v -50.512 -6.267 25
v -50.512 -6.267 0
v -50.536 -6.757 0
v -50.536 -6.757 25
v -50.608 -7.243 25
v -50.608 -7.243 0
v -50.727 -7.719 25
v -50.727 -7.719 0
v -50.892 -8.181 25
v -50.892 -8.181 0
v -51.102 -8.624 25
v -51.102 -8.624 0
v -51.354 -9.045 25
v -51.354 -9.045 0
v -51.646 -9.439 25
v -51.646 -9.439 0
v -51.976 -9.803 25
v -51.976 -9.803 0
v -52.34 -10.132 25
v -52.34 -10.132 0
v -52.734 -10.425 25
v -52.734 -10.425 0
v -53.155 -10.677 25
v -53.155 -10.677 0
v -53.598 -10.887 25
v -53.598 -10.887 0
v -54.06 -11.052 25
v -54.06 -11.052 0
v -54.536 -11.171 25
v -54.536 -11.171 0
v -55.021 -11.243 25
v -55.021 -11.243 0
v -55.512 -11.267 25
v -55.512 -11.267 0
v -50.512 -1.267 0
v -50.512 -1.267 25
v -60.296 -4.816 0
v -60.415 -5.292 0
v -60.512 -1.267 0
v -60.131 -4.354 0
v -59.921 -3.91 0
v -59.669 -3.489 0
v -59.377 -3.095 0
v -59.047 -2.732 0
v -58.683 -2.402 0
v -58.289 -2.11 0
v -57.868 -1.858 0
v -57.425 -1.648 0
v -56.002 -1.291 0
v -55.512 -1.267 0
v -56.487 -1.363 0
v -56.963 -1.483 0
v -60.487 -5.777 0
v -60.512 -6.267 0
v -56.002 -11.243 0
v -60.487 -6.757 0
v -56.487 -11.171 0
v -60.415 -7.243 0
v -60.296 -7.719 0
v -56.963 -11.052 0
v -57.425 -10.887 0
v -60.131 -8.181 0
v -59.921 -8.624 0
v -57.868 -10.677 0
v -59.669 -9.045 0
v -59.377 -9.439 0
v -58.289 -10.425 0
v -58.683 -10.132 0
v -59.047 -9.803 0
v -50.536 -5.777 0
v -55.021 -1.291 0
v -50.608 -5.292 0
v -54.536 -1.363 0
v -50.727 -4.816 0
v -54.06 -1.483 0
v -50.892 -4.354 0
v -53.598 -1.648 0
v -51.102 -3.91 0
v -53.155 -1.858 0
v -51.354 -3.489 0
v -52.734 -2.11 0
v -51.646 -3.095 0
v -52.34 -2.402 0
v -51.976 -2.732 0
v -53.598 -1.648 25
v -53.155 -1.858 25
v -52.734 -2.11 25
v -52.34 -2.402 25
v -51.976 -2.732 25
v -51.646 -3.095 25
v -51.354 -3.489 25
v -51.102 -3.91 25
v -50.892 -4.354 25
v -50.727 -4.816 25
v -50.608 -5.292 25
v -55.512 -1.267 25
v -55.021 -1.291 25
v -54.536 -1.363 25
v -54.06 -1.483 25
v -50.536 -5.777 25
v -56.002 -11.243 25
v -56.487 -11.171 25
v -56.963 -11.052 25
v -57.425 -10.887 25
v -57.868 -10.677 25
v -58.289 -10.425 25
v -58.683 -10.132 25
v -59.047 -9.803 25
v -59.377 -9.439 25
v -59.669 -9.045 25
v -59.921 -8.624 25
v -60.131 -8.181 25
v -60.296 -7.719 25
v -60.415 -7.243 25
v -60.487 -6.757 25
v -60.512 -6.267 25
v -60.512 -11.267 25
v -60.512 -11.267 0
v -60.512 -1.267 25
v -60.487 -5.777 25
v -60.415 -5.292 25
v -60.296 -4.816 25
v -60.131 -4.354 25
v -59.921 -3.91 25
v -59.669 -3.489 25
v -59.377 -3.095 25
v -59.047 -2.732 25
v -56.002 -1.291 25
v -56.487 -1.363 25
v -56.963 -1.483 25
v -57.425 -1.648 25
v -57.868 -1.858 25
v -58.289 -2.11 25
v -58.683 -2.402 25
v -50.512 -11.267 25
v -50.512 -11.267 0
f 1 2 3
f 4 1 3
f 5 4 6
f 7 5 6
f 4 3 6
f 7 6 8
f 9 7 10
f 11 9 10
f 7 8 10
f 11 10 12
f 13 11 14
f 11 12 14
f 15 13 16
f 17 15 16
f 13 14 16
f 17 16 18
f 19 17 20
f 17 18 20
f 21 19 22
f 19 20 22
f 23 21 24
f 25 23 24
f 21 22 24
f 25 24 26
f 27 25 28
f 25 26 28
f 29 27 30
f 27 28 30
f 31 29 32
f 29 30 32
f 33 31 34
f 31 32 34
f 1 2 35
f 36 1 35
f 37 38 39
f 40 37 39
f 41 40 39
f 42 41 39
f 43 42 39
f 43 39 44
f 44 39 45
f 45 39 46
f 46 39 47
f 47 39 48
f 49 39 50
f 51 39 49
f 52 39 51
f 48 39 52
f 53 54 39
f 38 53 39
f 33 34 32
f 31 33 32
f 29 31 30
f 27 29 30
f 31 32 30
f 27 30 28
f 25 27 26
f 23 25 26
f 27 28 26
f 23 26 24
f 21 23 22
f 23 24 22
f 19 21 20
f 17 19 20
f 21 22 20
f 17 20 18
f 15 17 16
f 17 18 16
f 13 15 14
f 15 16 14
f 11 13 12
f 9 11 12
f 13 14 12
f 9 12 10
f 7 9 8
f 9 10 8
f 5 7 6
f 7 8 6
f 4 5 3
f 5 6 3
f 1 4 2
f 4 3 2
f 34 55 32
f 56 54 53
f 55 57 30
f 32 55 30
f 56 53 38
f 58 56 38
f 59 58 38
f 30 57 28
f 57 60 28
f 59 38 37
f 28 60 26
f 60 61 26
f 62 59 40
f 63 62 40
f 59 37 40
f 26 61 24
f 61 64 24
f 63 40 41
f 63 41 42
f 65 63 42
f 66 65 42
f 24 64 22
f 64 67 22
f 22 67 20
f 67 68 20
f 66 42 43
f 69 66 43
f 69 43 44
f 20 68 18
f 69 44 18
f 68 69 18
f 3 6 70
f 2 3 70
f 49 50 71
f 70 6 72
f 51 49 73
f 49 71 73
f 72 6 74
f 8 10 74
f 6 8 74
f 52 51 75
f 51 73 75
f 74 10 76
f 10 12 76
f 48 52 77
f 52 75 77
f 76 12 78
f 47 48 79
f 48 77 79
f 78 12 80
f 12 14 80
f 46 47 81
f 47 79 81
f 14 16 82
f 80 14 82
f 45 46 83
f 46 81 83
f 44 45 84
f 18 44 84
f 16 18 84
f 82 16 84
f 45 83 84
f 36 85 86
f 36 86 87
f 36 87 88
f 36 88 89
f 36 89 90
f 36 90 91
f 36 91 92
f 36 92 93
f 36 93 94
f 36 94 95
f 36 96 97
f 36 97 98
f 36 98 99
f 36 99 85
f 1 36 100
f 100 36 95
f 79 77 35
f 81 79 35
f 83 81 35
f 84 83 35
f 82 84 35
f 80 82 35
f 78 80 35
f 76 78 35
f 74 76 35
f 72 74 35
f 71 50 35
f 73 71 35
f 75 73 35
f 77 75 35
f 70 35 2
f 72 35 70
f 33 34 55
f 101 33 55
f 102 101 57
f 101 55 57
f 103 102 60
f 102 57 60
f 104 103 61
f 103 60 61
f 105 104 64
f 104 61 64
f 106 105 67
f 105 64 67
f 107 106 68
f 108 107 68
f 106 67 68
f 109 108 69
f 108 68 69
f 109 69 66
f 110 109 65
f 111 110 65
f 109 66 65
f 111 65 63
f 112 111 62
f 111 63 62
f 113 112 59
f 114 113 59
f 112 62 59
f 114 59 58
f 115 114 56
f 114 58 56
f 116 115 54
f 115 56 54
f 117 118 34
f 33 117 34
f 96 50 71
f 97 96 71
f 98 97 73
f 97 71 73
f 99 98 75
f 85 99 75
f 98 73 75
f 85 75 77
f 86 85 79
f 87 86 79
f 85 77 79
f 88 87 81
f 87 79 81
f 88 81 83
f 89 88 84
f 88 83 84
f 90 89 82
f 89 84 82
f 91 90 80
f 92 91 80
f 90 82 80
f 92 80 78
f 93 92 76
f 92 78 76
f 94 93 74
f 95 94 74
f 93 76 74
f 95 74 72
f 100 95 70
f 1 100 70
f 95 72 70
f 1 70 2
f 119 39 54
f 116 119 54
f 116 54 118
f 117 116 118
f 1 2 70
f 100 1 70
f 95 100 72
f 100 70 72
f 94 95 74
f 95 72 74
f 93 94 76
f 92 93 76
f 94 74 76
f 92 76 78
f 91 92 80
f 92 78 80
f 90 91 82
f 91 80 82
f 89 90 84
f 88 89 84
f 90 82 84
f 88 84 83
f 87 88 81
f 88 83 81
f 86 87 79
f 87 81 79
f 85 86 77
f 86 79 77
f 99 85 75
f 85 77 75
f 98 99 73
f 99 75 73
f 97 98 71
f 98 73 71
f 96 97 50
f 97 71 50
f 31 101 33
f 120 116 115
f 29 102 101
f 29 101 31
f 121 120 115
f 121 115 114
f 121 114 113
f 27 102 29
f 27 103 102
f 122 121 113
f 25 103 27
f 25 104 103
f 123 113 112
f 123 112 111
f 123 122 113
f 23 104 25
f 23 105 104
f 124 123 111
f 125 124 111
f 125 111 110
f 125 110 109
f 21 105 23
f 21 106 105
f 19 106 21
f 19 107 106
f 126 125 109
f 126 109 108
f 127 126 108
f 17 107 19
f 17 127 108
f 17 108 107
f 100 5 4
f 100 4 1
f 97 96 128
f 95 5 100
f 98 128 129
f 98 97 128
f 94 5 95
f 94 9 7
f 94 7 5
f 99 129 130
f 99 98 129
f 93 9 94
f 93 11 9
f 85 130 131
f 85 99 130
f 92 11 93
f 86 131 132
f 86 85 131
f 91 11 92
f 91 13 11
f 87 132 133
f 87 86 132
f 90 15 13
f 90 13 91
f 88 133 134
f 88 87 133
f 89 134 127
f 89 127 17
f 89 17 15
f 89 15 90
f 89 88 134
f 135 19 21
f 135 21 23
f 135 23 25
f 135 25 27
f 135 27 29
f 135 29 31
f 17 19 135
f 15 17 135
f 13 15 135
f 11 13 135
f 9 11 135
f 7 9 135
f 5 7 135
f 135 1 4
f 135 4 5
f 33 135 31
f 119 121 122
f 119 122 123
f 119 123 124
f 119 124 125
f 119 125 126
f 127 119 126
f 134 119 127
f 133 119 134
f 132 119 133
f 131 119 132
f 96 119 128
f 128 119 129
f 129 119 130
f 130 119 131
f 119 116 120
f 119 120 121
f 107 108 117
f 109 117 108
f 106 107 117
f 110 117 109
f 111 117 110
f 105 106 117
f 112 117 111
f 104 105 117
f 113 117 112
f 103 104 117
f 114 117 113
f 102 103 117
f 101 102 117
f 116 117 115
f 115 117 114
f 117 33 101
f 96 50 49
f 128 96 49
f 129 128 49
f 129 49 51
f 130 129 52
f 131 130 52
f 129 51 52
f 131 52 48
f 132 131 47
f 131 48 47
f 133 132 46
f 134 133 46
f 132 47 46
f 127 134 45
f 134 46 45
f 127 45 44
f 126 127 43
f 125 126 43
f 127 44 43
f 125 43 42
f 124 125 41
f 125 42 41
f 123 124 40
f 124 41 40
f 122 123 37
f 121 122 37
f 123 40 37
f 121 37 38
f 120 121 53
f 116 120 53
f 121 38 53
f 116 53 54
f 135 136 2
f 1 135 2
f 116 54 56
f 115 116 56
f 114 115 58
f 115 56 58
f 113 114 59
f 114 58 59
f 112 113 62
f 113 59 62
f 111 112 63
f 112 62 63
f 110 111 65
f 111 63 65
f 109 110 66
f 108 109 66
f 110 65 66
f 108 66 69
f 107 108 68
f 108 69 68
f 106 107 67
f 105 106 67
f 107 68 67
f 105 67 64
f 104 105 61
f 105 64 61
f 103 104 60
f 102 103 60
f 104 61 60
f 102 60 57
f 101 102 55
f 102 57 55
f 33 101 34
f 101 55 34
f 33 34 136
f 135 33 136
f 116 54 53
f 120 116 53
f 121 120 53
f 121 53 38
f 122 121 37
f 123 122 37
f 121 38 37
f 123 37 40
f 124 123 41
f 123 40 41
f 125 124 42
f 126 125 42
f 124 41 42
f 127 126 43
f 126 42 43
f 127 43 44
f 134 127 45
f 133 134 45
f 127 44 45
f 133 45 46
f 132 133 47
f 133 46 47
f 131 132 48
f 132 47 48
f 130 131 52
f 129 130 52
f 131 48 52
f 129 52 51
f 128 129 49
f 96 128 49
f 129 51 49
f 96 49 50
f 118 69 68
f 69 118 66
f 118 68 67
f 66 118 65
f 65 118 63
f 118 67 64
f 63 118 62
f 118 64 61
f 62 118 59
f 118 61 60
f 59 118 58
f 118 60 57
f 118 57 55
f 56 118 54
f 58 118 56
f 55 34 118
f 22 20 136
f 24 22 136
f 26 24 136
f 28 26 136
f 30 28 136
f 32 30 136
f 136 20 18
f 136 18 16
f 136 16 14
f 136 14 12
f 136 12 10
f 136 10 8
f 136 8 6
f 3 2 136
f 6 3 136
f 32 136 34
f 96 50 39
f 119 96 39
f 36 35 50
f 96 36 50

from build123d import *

# Parameters (mm, degrees)
F1_DEPTH = 25
F0_W     = 120
F0_H     = 7.5
F2_DEPTH = 25


with BuildPart() as f1:
    # F0 (on Top) → F1 (new body)
    with BuildSketch(Plane.XY):
        with BuildLine():
            Line((-55.5115031336, -1.2673012726), (-60.5115031336, -1.2673012726))
            Line((-60.5115031336, -1.2673012726), (-60.5115031336, -6.2673012726))
            ThreePointArc((-60.5115031336, -6.2673012726), (-59.0470370395, -2.7317673667), (-55.5115031336, -1.2673012726))
        make_face()
    extrude(amount=F1_DEPTH)


with BuildPart() as f1b:
    # F0 (on Top) → F1, piece 2 (new body)
    with BuildSketch(Plane.XY):
        with BuildLine():
            Line((-50.5115031336, -1.2673012726), (-55.5115031336, -1.2673012726))
            ThreePointArc((-55.5115031336, -1.2673012726), (-51.9759692277, -2.7317673667), (-50.5115031336, -6.2673012726))
            Line((-50.5115031336, -6.2673012726), (-50.5115031336, -1.2673012726))
        make_face()
    extrude(amount=F1_DEPTH)


with BuildPart() as f1c:
    # F0 (on Top) → F1, piece 3 (new body)
    with BuildSketch(Plane.XY):
        with BuildLine():
            ThreePointArc((-55.5115031336, -11.2673012726), (-59.0470370395, -9.8028351785), (-60.5115031336, -6.2673012726))
            Line((-60.5115031336, -6.2673012726), (-60.5115031336, -11.2673012726))
            Line((-60.5115031336, -11.2673012726), (-55.5115031336, -11.2673012726))
        make_face()
    extrude(amount=F1_DEPTH)


with BuildPart() as f1d:
    # F0 (on Top) → F1, piece 4 (new body)
    with BuildSketch(Plane.XY):
        with BuildLine():
            Line((-50.5115031336, -11.2673012726), (-50.5115031336, -6.2673012726))
            ThreePointArc((-50.5115031336, -6.2673012726), (-51.9759692277, -9.8028351785), (-55.5115031336, -11.2673012726))
            Line((-55.5115031336, -11.2673012726), (-50.5115031336, -11.2673012726))
        make_face()
    extrude(amount=F1_DEPTH)


with BuildPart() as f1e:
    # F0 (on Top) → F1, piece 5 (new body)
    with BuildSketch(Plane.XY):
        with Locations((19.0931870043, -10.3215911984)):
            Rectangle(F0_W, F0_H)
    extrude(amount=F1_DEPTH)


with BuildPart() as f2:
    # F0 (on Top) → F2 (new body)
    with BuildSketch(Plane.XY):
        with BuildLine():
            ThreePointArc((-50.5115031336, -6.2673012726), (-51.9759692277, -2.7317673667), (-55.5115031336, -1.2673012726))
            ThreePointArc((-55.5115031336, -1.2673012726), (-59.0470370395, -2.7317673667), (-60.5115031336, -6.2673012726))
            ThreePointArc((-60.5115031336, -6.2673012726), (-59.0470370395, -9.8028351785), (-55.5115031336, -11.2673012726))
            ThreePointArc((-55.5115031336, -11.2673012726), (-51.9759692277, -9.8028351785), (-50.5115031336, -6.2673012726))
        make_face()
    extrude(amount=F2_DEPTH)


with BuildPart() as f2b:
    # F0 (on Top) → F2, piece 2 (new body)
    with BuildSketch(Plane.XY):
        with Locations((19.0931870043, -2.8215911984)):
            Rectangle(F0_W, F0_H)
    extrude(amount=F2_DEPTH)


solid = Compound([f1.part, f1b.part, f1c.part, f1d.part, f2.part])
